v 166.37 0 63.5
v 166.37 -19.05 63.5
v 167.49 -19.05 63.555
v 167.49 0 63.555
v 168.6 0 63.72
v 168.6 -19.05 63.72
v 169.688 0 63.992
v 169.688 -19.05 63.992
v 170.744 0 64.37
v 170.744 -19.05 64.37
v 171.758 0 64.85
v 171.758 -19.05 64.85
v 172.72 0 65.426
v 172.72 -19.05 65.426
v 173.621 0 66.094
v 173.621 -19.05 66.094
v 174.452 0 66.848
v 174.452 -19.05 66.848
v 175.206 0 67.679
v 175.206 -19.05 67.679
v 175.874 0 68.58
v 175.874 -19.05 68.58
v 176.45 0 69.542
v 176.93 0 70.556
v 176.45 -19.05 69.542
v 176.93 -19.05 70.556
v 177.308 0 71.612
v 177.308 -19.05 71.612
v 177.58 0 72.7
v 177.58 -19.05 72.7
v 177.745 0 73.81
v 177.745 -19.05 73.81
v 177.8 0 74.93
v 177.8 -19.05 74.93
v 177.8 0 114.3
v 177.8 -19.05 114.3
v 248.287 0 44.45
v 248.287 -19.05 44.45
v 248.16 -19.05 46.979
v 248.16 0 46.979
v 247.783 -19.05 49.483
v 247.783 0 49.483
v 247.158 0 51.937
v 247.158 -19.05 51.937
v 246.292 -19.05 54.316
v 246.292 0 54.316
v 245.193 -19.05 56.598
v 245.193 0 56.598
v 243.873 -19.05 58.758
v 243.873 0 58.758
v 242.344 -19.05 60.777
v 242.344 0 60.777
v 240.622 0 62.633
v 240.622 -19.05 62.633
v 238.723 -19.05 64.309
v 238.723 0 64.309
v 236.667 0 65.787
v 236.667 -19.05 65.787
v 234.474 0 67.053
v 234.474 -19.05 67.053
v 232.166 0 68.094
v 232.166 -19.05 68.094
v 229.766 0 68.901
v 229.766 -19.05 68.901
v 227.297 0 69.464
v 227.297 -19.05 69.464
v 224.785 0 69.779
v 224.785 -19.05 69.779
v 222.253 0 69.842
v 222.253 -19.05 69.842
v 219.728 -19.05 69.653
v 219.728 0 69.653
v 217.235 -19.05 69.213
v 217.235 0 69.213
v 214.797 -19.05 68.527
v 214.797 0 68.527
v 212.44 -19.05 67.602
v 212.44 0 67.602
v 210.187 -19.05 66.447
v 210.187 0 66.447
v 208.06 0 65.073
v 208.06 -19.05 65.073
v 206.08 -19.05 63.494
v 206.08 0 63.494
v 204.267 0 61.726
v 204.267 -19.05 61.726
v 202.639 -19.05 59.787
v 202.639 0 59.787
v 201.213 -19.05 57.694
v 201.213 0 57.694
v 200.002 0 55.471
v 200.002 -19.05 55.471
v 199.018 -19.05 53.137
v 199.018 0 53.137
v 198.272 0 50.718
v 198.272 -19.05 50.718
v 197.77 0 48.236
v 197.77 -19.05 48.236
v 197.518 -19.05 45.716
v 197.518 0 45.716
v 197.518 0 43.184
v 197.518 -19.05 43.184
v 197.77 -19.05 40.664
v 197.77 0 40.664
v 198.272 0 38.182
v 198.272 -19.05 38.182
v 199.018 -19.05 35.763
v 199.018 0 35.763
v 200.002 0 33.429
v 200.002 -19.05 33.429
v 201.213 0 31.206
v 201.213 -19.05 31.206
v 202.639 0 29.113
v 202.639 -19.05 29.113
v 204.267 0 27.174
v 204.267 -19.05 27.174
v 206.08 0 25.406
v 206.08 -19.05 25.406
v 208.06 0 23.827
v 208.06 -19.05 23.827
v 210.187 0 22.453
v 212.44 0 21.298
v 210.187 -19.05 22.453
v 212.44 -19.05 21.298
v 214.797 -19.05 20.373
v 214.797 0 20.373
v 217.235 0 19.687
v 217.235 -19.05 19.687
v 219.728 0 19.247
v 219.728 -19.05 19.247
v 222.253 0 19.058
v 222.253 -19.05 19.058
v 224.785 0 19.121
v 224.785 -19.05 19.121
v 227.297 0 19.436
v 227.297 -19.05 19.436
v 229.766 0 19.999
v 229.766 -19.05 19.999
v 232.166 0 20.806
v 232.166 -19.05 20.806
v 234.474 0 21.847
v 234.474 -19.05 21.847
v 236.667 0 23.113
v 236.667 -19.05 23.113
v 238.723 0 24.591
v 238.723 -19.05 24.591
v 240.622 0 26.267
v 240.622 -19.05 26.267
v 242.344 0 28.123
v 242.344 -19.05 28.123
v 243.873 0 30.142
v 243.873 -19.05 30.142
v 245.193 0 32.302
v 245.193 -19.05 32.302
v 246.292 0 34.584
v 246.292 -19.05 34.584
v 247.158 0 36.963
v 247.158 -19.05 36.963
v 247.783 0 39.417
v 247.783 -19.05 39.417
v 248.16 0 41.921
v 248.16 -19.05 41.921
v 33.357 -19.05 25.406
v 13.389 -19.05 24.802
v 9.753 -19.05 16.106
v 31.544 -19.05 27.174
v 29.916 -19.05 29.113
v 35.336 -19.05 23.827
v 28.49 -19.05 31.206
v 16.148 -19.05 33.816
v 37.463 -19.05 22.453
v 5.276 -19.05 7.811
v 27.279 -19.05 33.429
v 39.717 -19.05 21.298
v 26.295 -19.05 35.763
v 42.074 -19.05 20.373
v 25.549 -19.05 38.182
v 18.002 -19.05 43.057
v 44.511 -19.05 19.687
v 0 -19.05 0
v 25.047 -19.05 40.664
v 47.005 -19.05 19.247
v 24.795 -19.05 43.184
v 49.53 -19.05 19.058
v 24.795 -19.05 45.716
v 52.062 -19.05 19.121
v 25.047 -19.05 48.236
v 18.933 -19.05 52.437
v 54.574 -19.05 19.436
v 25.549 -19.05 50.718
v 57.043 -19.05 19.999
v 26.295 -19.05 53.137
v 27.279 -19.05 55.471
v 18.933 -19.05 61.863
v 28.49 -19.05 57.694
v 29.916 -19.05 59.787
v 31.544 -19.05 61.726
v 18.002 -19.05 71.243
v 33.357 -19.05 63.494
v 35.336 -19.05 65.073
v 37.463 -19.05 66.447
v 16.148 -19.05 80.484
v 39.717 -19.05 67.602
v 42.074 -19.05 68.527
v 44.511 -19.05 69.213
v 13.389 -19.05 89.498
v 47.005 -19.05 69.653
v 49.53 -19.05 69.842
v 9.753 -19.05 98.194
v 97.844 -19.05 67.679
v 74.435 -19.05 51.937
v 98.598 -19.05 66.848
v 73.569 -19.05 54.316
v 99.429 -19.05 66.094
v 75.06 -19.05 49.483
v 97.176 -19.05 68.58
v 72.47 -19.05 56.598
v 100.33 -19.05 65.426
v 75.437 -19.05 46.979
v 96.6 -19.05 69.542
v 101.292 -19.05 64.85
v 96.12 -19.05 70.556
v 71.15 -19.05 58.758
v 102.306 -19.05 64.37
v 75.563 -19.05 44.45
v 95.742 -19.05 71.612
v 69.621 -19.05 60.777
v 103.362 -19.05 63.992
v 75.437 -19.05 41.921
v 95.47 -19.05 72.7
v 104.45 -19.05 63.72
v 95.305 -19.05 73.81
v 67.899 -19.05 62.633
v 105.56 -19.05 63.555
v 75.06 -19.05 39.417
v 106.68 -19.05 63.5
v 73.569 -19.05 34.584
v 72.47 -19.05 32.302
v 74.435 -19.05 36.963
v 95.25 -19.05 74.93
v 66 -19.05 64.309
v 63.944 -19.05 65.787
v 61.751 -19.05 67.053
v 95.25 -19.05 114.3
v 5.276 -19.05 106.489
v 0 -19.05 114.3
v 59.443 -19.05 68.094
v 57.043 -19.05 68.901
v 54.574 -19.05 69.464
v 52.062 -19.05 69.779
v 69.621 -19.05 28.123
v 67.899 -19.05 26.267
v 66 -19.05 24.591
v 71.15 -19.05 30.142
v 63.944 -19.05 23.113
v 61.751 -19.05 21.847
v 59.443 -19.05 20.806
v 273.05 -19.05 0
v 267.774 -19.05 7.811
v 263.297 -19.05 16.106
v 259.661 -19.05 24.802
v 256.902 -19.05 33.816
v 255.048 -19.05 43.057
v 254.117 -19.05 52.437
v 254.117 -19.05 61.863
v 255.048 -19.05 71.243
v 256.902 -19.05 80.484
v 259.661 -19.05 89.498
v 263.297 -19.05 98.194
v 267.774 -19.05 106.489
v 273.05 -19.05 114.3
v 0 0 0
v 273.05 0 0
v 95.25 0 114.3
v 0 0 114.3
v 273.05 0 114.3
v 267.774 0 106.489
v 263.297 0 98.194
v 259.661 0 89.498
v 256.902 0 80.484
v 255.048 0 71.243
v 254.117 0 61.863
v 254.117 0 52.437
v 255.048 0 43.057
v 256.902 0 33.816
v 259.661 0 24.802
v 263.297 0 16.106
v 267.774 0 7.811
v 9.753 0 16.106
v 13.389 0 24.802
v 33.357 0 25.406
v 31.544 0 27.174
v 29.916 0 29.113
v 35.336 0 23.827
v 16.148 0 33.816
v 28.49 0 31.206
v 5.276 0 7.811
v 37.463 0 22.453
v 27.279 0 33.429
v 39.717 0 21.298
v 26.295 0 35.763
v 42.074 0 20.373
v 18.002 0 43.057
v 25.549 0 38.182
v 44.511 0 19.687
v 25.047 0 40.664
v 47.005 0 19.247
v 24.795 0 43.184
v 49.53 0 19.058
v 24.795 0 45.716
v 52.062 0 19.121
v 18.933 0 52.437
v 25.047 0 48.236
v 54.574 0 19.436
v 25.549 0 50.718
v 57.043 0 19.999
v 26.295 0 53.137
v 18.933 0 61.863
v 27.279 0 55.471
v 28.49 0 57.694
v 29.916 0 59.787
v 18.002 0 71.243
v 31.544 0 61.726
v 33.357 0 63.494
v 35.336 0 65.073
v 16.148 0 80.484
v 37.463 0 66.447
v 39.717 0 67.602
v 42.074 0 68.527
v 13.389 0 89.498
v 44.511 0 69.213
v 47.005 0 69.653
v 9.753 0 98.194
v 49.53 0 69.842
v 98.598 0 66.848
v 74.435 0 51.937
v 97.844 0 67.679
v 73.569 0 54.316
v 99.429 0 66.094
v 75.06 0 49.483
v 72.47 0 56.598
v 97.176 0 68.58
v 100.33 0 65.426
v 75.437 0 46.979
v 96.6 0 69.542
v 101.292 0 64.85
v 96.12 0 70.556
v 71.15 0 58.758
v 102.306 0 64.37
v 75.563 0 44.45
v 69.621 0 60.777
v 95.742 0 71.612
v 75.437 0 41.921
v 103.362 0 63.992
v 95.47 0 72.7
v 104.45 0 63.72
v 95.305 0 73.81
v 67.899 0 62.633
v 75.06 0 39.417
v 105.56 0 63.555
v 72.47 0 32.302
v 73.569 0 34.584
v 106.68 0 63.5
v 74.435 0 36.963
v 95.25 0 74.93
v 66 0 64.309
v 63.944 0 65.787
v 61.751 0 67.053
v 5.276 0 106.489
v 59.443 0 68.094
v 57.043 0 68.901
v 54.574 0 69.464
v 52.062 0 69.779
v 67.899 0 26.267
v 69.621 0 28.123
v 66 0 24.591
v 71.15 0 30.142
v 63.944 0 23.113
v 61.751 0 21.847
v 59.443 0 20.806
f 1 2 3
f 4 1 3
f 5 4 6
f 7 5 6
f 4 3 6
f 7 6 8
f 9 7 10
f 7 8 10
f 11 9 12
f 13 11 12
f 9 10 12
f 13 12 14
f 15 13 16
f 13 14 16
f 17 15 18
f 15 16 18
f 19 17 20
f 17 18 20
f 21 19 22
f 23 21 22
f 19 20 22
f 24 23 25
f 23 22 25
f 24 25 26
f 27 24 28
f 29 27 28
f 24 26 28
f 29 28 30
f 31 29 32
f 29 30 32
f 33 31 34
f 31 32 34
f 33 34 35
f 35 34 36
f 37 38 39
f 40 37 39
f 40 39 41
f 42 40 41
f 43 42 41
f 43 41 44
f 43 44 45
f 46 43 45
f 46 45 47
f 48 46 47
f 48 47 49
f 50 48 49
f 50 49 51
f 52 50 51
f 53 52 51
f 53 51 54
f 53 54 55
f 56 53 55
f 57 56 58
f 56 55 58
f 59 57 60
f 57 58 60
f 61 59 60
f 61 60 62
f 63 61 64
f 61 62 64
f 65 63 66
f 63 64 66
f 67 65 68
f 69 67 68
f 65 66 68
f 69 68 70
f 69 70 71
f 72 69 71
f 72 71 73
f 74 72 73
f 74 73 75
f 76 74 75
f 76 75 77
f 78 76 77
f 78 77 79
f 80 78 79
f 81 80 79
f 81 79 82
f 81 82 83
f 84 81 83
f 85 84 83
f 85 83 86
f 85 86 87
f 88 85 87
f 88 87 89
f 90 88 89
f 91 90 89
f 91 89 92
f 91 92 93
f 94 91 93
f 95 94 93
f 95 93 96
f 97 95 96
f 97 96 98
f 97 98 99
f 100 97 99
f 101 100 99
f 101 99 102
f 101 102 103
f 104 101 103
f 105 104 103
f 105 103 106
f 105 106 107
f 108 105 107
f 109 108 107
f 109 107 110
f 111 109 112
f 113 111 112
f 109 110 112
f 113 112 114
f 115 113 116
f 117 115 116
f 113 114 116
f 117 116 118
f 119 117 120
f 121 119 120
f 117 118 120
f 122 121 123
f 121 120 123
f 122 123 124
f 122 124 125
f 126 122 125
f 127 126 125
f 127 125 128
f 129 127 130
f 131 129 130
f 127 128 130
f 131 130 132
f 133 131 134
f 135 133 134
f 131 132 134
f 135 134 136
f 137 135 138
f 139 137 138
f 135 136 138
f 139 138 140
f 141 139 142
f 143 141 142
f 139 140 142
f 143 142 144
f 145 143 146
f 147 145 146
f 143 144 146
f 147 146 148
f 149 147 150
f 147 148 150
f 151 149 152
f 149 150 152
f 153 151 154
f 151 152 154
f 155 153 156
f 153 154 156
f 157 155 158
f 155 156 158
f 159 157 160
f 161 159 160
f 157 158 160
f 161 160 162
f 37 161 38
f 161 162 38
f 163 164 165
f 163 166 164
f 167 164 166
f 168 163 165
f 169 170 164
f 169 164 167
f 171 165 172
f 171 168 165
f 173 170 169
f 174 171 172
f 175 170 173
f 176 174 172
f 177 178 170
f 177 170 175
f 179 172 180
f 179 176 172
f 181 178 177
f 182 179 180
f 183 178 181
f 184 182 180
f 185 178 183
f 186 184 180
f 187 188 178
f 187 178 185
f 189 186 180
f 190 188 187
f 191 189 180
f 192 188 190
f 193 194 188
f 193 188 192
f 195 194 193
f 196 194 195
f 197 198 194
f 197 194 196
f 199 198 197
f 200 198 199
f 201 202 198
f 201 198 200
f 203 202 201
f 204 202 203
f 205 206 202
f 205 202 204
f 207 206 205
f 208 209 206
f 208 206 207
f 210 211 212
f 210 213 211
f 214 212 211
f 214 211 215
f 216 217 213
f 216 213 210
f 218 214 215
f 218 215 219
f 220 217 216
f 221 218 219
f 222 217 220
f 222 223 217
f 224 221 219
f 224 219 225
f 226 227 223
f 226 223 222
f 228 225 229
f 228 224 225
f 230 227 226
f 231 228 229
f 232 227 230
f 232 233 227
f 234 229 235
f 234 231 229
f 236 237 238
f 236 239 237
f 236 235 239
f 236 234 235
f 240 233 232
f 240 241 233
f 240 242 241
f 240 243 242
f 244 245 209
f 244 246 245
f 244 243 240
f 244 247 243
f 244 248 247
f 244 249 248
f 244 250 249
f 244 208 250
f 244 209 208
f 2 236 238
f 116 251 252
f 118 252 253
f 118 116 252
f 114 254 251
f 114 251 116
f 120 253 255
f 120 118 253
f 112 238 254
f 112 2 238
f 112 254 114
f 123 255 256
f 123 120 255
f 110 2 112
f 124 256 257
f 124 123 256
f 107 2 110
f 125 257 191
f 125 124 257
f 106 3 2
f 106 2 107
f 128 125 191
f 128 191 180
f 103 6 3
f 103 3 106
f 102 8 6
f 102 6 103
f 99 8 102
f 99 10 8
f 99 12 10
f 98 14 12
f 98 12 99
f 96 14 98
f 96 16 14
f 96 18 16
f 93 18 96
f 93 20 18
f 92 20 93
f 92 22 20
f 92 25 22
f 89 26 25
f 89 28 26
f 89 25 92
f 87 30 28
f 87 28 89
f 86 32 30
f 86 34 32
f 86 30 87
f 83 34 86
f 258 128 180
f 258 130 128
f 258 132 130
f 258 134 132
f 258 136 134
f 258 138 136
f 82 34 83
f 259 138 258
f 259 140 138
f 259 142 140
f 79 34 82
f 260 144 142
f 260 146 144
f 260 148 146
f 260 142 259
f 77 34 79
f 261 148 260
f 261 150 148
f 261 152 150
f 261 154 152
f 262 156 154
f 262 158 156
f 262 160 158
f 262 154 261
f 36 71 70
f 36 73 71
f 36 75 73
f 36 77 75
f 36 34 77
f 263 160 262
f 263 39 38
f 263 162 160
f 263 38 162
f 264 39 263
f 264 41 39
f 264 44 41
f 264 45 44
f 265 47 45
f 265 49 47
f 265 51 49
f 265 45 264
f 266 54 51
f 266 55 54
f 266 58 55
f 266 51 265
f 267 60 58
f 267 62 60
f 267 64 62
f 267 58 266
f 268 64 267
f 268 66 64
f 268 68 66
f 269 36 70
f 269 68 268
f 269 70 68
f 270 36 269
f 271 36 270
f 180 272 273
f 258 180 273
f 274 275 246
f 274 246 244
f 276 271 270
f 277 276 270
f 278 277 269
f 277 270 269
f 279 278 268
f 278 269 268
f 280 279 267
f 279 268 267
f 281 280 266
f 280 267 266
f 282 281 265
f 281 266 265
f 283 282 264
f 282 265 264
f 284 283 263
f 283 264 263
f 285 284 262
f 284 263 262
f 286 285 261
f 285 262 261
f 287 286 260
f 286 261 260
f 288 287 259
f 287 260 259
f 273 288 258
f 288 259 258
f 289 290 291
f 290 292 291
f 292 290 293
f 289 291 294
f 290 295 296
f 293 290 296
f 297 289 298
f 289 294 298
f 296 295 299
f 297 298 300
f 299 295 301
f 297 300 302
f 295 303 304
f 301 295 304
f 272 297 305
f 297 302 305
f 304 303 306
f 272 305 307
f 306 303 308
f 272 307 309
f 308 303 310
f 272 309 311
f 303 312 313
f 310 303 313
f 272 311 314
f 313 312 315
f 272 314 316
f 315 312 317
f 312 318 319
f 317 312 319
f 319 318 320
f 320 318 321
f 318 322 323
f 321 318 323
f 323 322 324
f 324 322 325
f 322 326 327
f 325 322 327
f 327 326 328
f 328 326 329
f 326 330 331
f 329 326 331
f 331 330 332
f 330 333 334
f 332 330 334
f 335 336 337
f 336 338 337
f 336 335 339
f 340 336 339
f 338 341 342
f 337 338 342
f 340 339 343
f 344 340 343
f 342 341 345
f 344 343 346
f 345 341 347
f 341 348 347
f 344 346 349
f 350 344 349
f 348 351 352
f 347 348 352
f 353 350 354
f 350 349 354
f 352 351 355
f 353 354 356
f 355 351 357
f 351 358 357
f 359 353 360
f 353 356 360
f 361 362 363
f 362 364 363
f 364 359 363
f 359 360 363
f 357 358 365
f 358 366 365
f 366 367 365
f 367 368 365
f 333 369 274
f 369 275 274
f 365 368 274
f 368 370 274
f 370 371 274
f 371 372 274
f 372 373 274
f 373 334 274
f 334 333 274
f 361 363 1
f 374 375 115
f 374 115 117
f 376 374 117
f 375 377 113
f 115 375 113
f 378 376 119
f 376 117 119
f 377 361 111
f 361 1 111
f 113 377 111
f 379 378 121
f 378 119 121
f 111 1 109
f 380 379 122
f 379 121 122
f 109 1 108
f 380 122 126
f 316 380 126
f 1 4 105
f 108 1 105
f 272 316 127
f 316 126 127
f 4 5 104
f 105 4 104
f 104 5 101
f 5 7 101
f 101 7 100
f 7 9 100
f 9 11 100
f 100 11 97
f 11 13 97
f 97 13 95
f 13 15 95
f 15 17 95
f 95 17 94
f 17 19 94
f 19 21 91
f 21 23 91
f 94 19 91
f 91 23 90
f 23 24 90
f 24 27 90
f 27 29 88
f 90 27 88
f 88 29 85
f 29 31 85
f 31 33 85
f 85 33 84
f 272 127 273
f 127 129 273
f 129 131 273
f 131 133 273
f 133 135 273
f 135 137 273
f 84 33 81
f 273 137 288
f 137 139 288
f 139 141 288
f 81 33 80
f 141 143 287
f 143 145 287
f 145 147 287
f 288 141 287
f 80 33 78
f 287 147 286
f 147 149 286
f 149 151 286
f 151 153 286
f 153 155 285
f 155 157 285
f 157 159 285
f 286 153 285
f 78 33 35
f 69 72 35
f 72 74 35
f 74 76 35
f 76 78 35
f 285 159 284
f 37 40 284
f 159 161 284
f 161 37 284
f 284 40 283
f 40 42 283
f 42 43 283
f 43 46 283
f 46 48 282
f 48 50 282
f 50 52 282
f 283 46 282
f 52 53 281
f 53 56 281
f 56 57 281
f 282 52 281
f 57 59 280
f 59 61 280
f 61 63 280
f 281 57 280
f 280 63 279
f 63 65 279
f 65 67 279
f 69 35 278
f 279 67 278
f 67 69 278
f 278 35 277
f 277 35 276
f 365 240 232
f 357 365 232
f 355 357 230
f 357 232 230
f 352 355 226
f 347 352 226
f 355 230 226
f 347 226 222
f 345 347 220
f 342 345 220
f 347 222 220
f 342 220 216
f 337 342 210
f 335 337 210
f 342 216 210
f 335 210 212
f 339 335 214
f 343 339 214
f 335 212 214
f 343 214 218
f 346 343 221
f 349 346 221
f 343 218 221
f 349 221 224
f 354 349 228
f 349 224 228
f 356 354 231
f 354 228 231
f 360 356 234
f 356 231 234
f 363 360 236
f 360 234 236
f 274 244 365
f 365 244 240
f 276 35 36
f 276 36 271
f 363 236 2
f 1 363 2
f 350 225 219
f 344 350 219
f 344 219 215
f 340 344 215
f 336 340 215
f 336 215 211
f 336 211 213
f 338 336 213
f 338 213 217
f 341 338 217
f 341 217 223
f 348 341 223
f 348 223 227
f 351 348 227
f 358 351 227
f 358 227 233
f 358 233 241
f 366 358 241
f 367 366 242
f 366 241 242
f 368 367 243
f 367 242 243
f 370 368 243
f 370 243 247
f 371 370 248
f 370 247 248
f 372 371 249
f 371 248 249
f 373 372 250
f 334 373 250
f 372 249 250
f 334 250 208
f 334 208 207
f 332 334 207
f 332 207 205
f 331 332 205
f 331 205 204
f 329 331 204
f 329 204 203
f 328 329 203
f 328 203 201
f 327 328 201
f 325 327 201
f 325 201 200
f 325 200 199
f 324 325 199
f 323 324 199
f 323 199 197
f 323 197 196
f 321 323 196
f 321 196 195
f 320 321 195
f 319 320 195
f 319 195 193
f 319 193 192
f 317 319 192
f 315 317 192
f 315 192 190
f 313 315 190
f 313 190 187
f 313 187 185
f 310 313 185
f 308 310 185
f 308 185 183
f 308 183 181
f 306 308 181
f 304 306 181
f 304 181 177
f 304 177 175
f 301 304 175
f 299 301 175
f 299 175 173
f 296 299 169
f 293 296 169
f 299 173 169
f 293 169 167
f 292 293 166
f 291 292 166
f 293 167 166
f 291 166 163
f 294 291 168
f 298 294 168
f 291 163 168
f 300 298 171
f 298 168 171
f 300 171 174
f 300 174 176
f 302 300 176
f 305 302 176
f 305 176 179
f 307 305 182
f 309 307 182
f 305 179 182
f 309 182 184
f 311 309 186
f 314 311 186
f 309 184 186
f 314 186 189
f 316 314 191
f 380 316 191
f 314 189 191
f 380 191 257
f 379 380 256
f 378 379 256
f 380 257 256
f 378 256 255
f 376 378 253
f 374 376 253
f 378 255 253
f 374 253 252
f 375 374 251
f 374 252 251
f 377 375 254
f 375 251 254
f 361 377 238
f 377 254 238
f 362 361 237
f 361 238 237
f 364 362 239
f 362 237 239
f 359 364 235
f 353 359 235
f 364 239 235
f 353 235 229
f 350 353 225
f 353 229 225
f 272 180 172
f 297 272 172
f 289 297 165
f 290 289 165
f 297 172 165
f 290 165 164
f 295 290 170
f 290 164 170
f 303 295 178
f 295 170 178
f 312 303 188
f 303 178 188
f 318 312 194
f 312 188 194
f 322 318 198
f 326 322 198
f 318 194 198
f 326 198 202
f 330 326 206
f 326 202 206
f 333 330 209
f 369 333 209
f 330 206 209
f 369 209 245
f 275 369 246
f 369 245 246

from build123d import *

# Parameters (mm, degrees)
F0_W     = 273.05
F0_H     = 114.3
F1_DEPTH = 19.05
F3_DEPTH = 25.4
F4_R     = 25.4
F5_DEPTH = 25.4


with BuildPart() as f1:
    # F0 (on Front) → F1 (new body)
    with BuildSketch(Plane.XZ):
        with Locations((136.525, 57.15)):
            Rectangle(F0_W, F0_H)
    extrude(amount=F1_DEPTH)

    # F2 (on face) → F3 (cut)
    with BuildSketch(Plane.XZ.offset(19.05)):
        with BuildLine():
            Line((0, 114.3), (0, 0))
            ThreePointArc((0, 0), (19.05, 57.15), (0, 114.3))
        make_face()
        with BuildLine():
            ThreePointArc((273.05, 114.3), (254, 57.15), (273.05, 0))
            Line((273.05, 0), (273.05, 114.3))
        make_face()
    extrude(amount=-F3_DEPTH, mode=Mode.SUBTRACT)

    # F4 (on face) → F5 (cut)
    with BuildSketch(Plane.XZ.offset(19.05)):
        with BuildLine():
            Line((177.8, 114.3), (95.25, 114.3))
            Line((95.25, 114.3), (95.25, 74.93))
            ThreePointArc((95.25, 74.93), (106.68, 86.36), (118.11, 74.93))
            ThreePointArc((118.11, 74.93), (114.762231, 66.847769), (106.68, 63.5))
            Line((106.68, 63.5), (166.37, 63.5))
            ThreePointArc((166.37, 63.5), (158.287769, 83.012231), (177.8, 74.93))
            Line((177.8, 74.93), (177.8, 114.3))
        make_face()
        with Locations((50.163405, 44.45)):
            Circle(F4_R)
        with Locations((222.886595, 44.45)):
            Circle(F4_R)
        with BuildLine():
            ThreePointArc((166.37, 63.5), (174.452231, 66.847769), (177.8, 74.93))
            ThreePointArc((177.8, 74.93), (158.287769, 83.012231), (166.37, 63.5))
        make_face()
        with BuildLine():
            ThreePointArc((118.11, 74.93), (106.68, 86.36), (95.25, 74.93))
            ThreePointArc((95.25, 74.93), (98.597769, 66.847769), (106.68, 63.5))
            ThreePointArc((106.68, 63.5), (114.762231, 66.847769), (118.11, 74.93))
        make_face()
    extrude(amount=-F5_DEPTH, mode=Mode.SUBTRACT)


solid = f1.part
